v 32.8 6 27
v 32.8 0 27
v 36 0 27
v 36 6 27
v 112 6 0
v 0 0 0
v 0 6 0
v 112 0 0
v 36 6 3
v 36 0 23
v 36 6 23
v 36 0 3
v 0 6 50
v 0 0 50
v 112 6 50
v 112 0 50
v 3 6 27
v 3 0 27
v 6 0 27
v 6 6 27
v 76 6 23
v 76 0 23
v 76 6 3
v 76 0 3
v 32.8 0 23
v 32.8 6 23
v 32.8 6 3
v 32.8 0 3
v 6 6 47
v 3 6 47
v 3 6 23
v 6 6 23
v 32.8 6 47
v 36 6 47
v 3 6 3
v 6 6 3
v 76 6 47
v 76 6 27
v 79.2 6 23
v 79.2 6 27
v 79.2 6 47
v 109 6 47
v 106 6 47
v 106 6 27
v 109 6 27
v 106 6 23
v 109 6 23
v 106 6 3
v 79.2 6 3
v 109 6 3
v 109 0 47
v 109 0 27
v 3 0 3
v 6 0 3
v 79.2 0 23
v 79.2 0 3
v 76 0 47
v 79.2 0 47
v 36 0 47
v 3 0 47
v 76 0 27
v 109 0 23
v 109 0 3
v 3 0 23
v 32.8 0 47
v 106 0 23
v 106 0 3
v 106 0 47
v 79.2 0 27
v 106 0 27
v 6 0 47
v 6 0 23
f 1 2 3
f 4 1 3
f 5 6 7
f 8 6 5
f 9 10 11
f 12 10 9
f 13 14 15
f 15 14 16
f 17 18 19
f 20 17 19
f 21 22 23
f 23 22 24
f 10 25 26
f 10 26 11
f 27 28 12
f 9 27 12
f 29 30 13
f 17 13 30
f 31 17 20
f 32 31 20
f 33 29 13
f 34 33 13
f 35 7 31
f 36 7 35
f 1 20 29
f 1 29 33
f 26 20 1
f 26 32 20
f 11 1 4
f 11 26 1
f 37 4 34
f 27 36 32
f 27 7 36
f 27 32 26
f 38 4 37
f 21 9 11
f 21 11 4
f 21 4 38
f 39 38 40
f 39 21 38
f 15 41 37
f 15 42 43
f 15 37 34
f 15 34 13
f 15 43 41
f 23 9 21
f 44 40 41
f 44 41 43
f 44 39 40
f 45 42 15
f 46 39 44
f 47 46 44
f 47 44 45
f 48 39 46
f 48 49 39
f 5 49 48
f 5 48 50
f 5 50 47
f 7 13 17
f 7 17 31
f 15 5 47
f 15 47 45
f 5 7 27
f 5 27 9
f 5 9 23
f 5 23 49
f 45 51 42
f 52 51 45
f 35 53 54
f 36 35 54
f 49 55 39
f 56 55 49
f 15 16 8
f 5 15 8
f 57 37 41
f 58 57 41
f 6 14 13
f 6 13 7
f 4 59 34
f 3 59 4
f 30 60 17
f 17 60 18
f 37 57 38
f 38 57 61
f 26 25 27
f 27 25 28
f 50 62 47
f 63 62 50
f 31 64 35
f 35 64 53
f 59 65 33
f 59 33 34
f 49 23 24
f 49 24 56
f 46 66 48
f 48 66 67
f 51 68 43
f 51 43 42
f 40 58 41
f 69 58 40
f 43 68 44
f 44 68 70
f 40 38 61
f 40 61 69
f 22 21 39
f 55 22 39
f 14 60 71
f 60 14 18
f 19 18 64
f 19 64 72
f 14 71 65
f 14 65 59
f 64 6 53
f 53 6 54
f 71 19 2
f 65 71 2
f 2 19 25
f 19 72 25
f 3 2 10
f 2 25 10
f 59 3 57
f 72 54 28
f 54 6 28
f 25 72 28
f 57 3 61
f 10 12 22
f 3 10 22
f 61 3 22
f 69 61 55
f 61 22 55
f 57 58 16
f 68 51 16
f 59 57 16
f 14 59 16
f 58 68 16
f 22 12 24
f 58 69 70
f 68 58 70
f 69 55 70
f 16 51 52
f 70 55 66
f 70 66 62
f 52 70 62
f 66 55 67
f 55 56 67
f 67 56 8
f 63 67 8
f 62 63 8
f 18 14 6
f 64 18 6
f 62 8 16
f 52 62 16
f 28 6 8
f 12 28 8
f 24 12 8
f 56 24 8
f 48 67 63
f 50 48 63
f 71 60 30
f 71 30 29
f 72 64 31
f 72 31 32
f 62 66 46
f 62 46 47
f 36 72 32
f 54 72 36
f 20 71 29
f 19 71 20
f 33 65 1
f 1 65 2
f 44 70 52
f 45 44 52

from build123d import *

# Parameters (mm, degrees)
SKETCH_1_W      = 112
SKETCH_1_H      = 50
SKETCH_1_W_2    = 3
SKETCH_1_H_2    = 20
SKETCH_1_W_3    = 3.2
EXTRUDE_1_DEPTH = 6


with BuildPart() as part:
    # 草图1 → 凸台-拉伸1 (new body)
    with BuildSketch(Plane(origin=(0, 0, 0), x_dir=(1, 0, 0), z_dir=(0, 1, 0))):
        with Locations((56, -25)):
            Rectangle(SKETCH_1_W, SKETCH_1_H)
        with Locations((4.5, -13)):
            Rectangle(SKETCH_1_W_2, SKETCH_1_H_2, mode=Mode.SUBTRACT)
        with Locations((4.5, -37)):
            Rectangle(SKETCH_1_W_2, SKETCH_1_H_2, mode=Mode.SUBTRACT)
        with Locations((107.5, -13)):
            Rectangle(SKETCH_1_W_2, SKETCH_1_H_2, mode=Mode.SUBTRACT)
        with Locations((107.5, -37)):
            Rectangle(SKETCH_1_W_2, SKETCH_1_H_2, mode=Mode.SUBTRACT)
        with Locations((34.4, -37)):
            Rectangle(SKETCH_1_W_3, SKETCH_1_H_2, mode=Mode.SUBTRACT)
        with Locations((34.4, -13)):
            Rectangle(SKETCH_1_W_3, SKETCH_1_H_2, mode=Mode.SUBTRACT)
        with Locations((77.6, -37)):
            Rectangle(SKETCH_1_W_3, SKETCH_1_H_2, mode=Mode.SUBTRACT)
        with Locations((77.6, -13)):
            Rectangle(SKETCH_1_W_3, SKETCH_1_H_2, mode=Mode.SUBTRACT)
    extrude(amount=EXTRUDE_1_DEPTH)


solid = part.part
